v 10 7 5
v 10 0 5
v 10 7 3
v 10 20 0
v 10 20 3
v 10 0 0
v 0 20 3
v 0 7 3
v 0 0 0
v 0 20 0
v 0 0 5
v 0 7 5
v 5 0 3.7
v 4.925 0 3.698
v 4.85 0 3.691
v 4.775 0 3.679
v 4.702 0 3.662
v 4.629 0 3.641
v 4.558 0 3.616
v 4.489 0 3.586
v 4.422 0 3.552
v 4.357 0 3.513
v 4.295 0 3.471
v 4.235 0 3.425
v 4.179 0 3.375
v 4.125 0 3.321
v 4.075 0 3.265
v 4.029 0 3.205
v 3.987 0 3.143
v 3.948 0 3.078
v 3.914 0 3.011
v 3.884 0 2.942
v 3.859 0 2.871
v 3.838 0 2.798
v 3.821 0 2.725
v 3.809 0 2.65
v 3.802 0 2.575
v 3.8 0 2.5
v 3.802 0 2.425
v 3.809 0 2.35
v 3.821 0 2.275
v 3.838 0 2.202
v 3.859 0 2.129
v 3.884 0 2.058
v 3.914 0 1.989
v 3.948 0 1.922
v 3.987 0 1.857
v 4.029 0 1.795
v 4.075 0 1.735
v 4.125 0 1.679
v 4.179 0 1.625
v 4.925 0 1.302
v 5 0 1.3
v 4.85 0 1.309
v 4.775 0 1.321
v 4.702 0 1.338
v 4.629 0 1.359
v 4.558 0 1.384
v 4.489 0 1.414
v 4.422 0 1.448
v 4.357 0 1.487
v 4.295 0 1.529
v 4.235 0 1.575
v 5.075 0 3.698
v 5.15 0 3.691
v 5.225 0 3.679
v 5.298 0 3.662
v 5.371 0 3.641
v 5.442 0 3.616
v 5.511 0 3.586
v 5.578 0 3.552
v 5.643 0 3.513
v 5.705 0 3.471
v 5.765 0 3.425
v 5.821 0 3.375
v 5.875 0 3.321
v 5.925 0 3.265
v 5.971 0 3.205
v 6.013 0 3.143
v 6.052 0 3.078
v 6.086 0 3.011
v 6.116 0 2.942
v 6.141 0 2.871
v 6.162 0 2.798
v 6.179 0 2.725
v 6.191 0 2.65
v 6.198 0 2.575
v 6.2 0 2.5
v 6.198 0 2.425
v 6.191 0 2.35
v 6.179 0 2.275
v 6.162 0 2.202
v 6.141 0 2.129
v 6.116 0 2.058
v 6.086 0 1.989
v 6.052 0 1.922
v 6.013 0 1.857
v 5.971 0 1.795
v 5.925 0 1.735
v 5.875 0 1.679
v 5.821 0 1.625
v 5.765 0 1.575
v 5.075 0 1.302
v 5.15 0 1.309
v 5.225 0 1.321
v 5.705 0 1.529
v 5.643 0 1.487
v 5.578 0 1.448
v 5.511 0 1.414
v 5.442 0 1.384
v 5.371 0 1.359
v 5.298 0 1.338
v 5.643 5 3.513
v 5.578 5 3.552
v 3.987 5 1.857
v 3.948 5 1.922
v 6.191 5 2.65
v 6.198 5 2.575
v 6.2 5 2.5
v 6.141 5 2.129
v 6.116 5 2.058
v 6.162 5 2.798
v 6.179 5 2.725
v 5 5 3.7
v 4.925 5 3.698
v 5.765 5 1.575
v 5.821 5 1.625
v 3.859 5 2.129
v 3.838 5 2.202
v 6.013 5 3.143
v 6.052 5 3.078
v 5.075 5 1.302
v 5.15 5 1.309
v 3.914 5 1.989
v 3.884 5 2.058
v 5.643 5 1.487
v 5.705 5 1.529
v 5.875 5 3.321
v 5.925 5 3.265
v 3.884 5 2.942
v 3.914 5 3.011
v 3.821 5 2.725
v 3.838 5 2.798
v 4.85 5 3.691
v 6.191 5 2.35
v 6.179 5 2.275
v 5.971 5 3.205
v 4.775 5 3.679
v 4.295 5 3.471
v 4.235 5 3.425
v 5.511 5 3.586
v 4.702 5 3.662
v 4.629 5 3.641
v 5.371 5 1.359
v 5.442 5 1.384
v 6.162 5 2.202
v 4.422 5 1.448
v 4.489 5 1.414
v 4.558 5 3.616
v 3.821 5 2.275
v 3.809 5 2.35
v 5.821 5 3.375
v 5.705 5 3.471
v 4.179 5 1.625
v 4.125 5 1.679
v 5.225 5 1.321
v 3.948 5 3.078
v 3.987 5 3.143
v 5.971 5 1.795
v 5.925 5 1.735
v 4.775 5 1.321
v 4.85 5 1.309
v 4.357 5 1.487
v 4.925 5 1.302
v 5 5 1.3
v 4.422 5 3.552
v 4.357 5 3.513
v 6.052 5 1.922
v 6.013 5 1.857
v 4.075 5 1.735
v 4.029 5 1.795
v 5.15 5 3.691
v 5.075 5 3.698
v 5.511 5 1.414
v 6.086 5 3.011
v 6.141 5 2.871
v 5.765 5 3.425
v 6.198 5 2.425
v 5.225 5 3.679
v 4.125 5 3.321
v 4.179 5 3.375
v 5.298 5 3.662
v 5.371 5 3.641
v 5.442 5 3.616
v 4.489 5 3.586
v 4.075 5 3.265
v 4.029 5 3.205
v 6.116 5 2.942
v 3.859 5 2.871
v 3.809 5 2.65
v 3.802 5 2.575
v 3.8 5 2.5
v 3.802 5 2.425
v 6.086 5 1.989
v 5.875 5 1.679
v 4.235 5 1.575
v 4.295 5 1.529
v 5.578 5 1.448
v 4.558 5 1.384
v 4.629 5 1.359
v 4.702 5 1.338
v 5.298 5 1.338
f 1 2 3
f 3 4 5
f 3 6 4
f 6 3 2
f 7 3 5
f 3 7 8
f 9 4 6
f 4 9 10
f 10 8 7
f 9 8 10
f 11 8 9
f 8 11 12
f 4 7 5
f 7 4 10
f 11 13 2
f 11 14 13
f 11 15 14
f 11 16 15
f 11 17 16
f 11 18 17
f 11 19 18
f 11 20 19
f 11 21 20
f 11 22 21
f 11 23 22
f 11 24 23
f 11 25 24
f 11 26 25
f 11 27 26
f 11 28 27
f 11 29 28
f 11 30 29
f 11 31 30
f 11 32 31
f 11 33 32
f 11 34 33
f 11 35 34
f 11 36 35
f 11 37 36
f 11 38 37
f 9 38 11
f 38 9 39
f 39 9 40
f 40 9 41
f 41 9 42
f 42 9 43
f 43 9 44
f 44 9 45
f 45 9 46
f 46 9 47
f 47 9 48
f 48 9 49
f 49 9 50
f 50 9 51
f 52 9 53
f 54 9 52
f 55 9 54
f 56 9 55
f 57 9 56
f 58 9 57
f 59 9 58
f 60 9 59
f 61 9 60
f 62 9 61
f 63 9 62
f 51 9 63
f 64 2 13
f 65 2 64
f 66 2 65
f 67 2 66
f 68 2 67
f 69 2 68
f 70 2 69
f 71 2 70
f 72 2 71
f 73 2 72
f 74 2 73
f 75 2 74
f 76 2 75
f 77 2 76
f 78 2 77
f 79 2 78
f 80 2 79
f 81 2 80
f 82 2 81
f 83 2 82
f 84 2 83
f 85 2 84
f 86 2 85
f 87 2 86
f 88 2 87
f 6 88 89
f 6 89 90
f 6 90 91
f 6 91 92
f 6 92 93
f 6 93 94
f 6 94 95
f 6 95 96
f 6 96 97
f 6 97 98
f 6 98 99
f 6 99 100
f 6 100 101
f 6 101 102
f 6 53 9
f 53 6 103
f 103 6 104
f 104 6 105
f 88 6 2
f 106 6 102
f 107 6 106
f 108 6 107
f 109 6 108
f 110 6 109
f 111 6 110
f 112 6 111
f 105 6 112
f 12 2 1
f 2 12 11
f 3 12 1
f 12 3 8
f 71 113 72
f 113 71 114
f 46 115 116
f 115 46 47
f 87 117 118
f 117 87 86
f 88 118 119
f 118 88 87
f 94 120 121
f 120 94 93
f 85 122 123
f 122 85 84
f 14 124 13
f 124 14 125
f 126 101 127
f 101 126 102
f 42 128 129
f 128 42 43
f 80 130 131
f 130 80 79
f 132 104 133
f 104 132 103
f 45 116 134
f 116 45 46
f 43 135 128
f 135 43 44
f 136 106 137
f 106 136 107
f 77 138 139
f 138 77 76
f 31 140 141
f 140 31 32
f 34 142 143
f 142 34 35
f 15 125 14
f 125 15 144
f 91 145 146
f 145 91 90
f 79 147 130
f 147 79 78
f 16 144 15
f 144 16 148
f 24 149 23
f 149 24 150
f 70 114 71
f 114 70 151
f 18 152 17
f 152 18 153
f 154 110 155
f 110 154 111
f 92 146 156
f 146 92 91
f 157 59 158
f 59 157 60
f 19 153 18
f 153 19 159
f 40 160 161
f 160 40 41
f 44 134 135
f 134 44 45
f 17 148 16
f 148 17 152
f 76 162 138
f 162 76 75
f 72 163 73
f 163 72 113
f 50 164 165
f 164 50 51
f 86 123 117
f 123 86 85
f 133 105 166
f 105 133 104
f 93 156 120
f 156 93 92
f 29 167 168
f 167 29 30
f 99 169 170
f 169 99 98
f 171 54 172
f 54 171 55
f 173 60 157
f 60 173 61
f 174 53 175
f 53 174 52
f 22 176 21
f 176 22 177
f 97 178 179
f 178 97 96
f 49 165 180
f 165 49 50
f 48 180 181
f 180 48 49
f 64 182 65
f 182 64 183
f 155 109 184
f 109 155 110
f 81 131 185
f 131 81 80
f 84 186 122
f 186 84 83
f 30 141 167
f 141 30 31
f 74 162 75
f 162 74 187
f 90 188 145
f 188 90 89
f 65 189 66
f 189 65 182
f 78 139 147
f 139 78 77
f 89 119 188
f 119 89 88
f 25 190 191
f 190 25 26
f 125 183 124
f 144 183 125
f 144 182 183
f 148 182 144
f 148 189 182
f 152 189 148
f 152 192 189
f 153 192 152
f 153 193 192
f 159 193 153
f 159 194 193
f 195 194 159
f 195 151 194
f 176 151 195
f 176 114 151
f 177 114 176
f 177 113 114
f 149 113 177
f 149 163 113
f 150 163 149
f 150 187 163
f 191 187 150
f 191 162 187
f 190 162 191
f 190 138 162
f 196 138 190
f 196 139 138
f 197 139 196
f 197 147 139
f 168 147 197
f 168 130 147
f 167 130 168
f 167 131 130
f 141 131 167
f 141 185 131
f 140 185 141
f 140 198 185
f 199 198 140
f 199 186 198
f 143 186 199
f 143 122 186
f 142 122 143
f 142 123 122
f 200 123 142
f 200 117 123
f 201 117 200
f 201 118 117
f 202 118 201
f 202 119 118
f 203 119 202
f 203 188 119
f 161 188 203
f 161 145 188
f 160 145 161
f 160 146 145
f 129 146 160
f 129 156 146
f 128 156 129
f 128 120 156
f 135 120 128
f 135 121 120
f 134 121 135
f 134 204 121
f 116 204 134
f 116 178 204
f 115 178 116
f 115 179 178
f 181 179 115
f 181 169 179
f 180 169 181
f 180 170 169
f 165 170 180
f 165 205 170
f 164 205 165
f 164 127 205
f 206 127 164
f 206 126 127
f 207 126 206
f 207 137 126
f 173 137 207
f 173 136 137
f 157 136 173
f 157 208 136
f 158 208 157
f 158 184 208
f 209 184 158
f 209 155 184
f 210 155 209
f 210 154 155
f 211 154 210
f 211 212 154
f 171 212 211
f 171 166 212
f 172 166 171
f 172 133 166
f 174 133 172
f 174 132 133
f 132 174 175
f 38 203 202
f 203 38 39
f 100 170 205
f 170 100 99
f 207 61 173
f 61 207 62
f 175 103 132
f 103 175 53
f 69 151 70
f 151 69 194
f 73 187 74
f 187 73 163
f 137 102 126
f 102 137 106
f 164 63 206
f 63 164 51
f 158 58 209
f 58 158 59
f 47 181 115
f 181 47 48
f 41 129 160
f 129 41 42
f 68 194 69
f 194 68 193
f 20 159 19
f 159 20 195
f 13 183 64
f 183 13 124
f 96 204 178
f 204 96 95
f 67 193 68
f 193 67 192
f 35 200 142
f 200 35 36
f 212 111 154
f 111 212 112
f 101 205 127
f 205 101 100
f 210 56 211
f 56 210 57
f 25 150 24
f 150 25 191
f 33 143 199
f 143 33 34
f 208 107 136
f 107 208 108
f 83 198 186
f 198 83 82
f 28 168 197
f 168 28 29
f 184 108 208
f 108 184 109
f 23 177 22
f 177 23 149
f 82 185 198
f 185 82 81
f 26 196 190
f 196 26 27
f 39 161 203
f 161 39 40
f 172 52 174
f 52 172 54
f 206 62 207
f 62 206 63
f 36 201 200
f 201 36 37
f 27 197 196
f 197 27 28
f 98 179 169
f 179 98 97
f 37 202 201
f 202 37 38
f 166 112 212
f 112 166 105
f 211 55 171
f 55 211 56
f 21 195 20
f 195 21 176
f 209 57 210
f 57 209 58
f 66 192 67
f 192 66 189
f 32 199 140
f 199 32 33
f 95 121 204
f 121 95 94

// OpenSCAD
difference(){
	union(){ 

        translate([0,0,0]){
           cube([10,20,3], center=false);
        }                
        translate([0,0,0]){
           cube([10,7,5], center=false);
        }                

	}
	union() {
        translate([5,5,2.5]){
            rotate([90,0,0]){
                cylinder(h=11, r=1.2, $fn=100, center=false);
            }   
        }

	}
}
